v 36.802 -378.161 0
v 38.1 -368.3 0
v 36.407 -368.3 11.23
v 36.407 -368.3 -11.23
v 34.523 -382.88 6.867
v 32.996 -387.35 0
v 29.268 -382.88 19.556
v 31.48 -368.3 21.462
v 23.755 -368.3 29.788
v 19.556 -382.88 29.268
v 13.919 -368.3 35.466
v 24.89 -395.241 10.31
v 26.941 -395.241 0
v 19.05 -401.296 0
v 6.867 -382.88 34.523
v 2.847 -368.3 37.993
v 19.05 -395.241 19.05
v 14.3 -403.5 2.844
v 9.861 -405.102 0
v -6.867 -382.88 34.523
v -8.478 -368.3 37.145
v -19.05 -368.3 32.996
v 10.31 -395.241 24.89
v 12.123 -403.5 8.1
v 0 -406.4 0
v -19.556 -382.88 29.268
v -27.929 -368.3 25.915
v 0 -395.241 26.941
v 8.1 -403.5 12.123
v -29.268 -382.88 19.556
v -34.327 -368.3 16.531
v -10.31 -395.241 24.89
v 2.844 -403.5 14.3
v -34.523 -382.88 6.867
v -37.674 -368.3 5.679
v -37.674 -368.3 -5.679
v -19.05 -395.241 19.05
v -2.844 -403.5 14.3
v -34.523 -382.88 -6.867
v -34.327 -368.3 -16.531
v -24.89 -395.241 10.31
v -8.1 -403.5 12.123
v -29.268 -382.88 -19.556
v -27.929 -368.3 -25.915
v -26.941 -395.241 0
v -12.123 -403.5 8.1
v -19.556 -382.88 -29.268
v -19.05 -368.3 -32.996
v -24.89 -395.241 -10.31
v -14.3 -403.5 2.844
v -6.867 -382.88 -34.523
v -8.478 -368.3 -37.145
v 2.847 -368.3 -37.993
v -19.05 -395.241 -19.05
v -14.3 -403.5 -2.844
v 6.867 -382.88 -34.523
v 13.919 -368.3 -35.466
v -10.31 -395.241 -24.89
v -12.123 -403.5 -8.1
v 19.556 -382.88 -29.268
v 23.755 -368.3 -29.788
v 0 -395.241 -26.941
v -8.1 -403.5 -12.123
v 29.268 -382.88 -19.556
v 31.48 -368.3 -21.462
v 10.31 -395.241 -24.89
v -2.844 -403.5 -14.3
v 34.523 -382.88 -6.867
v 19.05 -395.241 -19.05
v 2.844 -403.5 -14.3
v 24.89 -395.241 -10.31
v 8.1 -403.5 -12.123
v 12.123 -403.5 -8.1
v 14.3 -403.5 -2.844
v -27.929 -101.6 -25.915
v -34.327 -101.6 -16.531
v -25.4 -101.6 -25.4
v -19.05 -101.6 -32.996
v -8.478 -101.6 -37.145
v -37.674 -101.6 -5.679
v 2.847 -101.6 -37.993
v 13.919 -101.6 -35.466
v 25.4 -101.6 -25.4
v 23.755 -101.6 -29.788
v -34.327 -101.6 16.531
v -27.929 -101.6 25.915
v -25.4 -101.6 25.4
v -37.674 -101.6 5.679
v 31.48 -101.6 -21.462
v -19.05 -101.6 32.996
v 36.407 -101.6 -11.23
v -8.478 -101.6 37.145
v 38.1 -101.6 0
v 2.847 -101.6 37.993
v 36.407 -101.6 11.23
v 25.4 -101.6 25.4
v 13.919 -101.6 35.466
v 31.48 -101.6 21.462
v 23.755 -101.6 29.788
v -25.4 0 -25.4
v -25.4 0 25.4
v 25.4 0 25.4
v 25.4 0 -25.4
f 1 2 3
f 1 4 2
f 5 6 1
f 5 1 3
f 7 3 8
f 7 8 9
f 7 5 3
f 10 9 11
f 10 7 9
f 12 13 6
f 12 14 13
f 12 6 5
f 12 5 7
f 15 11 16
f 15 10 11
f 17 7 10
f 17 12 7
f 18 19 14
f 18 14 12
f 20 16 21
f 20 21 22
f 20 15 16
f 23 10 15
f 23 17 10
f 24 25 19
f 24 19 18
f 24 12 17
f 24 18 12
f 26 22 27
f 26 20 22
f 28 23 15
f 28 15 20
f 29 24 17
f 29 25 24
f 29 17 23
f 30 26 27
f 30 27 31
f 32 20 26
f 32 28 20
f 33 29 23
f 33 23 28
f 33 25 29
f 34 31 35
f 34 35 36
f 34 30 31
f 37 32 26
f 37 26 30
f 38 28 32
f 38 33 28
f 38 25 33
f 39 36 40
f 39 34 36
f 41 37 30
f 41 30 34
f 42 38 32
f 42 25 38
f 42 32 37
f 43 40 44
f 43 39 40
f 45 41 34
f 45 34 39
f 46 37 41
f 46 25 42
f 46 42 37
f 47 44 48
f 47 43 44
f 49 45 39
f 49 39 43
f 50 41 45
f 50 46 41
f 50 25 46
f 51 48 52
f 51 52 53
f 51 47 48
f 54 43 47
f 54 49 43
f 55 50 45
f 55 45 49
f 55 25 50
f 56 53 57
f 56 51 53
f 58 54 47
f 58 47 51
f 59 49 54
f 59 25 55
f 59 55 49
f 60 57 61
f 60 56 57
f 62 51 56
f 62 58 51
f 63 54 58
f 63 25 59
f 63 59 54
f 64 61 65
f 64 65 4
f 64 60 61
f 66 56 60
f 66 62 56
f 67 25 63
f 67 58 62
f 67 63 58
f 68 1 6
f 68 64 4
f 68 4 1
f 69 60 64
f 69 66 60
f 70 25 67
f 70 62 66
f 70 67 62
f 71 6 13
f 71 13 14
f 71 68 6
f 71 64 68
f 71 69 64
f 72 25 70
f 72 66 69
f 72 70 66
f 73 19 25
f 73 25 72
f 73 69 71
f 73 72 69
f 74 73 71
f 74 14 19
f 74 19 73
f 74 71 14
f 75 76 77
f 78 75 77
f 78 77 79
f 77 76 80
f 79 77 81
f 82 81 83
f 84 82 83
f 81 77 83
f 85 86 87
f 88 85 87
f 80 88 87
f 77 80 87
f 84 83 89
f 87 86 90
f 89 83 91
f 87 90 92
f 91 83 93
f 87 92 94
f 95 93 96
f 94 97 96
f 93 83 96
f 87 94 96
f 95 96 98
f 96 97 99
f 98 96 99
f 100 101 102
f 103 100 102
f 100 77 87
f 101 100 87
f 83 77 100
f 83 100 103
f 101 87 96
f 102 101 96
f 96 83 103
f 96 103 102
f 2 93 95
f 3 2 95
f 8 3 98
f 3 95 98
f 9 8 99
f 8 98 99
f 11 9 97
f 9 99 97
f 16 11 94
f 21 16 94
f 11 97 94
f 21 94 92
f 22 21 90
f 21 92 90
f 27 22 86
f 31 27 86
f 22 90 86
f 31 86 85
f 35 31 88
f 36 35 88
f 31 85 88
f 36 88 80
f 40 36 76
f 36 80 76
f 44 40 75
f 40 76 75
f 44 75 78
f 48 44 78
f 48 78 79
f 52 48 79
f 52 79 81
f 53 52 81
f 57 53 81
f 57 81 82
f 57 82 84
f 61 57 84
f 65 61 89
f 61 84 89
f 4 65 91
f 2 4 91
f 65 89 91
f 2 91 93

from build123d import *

# Parameters (mm, degrees)
F0_W     = 50.8
F0_H     = 50.8
F1_DEPTH = 101.6
F2_R     = 38.1
F3_DEPTH = 304.8
F4_R     = 38.1


with BuildPart() as f1:
    # F0 (on Front) → F1 (new body)
    with BuildSketch(Plane.XZ):
        Rectangle(F0_W, F0_H)
    extrude(amount=F1_DEPTH)

    # F2 (on face) → F3 (join)
    with BuildSketch(Plane.XZ.offset(101.6)):
        Circle(F2_R)
    extrude(amount=F3_DEPTH)

    # F4
    f4_edges = [f1.edges().sort_by_distance(p)[0] for p in [
        (-38.1, -406.4, 0),
    ]]
    fillet(f4_edges, radius=F4_R)


solid = f1.part
